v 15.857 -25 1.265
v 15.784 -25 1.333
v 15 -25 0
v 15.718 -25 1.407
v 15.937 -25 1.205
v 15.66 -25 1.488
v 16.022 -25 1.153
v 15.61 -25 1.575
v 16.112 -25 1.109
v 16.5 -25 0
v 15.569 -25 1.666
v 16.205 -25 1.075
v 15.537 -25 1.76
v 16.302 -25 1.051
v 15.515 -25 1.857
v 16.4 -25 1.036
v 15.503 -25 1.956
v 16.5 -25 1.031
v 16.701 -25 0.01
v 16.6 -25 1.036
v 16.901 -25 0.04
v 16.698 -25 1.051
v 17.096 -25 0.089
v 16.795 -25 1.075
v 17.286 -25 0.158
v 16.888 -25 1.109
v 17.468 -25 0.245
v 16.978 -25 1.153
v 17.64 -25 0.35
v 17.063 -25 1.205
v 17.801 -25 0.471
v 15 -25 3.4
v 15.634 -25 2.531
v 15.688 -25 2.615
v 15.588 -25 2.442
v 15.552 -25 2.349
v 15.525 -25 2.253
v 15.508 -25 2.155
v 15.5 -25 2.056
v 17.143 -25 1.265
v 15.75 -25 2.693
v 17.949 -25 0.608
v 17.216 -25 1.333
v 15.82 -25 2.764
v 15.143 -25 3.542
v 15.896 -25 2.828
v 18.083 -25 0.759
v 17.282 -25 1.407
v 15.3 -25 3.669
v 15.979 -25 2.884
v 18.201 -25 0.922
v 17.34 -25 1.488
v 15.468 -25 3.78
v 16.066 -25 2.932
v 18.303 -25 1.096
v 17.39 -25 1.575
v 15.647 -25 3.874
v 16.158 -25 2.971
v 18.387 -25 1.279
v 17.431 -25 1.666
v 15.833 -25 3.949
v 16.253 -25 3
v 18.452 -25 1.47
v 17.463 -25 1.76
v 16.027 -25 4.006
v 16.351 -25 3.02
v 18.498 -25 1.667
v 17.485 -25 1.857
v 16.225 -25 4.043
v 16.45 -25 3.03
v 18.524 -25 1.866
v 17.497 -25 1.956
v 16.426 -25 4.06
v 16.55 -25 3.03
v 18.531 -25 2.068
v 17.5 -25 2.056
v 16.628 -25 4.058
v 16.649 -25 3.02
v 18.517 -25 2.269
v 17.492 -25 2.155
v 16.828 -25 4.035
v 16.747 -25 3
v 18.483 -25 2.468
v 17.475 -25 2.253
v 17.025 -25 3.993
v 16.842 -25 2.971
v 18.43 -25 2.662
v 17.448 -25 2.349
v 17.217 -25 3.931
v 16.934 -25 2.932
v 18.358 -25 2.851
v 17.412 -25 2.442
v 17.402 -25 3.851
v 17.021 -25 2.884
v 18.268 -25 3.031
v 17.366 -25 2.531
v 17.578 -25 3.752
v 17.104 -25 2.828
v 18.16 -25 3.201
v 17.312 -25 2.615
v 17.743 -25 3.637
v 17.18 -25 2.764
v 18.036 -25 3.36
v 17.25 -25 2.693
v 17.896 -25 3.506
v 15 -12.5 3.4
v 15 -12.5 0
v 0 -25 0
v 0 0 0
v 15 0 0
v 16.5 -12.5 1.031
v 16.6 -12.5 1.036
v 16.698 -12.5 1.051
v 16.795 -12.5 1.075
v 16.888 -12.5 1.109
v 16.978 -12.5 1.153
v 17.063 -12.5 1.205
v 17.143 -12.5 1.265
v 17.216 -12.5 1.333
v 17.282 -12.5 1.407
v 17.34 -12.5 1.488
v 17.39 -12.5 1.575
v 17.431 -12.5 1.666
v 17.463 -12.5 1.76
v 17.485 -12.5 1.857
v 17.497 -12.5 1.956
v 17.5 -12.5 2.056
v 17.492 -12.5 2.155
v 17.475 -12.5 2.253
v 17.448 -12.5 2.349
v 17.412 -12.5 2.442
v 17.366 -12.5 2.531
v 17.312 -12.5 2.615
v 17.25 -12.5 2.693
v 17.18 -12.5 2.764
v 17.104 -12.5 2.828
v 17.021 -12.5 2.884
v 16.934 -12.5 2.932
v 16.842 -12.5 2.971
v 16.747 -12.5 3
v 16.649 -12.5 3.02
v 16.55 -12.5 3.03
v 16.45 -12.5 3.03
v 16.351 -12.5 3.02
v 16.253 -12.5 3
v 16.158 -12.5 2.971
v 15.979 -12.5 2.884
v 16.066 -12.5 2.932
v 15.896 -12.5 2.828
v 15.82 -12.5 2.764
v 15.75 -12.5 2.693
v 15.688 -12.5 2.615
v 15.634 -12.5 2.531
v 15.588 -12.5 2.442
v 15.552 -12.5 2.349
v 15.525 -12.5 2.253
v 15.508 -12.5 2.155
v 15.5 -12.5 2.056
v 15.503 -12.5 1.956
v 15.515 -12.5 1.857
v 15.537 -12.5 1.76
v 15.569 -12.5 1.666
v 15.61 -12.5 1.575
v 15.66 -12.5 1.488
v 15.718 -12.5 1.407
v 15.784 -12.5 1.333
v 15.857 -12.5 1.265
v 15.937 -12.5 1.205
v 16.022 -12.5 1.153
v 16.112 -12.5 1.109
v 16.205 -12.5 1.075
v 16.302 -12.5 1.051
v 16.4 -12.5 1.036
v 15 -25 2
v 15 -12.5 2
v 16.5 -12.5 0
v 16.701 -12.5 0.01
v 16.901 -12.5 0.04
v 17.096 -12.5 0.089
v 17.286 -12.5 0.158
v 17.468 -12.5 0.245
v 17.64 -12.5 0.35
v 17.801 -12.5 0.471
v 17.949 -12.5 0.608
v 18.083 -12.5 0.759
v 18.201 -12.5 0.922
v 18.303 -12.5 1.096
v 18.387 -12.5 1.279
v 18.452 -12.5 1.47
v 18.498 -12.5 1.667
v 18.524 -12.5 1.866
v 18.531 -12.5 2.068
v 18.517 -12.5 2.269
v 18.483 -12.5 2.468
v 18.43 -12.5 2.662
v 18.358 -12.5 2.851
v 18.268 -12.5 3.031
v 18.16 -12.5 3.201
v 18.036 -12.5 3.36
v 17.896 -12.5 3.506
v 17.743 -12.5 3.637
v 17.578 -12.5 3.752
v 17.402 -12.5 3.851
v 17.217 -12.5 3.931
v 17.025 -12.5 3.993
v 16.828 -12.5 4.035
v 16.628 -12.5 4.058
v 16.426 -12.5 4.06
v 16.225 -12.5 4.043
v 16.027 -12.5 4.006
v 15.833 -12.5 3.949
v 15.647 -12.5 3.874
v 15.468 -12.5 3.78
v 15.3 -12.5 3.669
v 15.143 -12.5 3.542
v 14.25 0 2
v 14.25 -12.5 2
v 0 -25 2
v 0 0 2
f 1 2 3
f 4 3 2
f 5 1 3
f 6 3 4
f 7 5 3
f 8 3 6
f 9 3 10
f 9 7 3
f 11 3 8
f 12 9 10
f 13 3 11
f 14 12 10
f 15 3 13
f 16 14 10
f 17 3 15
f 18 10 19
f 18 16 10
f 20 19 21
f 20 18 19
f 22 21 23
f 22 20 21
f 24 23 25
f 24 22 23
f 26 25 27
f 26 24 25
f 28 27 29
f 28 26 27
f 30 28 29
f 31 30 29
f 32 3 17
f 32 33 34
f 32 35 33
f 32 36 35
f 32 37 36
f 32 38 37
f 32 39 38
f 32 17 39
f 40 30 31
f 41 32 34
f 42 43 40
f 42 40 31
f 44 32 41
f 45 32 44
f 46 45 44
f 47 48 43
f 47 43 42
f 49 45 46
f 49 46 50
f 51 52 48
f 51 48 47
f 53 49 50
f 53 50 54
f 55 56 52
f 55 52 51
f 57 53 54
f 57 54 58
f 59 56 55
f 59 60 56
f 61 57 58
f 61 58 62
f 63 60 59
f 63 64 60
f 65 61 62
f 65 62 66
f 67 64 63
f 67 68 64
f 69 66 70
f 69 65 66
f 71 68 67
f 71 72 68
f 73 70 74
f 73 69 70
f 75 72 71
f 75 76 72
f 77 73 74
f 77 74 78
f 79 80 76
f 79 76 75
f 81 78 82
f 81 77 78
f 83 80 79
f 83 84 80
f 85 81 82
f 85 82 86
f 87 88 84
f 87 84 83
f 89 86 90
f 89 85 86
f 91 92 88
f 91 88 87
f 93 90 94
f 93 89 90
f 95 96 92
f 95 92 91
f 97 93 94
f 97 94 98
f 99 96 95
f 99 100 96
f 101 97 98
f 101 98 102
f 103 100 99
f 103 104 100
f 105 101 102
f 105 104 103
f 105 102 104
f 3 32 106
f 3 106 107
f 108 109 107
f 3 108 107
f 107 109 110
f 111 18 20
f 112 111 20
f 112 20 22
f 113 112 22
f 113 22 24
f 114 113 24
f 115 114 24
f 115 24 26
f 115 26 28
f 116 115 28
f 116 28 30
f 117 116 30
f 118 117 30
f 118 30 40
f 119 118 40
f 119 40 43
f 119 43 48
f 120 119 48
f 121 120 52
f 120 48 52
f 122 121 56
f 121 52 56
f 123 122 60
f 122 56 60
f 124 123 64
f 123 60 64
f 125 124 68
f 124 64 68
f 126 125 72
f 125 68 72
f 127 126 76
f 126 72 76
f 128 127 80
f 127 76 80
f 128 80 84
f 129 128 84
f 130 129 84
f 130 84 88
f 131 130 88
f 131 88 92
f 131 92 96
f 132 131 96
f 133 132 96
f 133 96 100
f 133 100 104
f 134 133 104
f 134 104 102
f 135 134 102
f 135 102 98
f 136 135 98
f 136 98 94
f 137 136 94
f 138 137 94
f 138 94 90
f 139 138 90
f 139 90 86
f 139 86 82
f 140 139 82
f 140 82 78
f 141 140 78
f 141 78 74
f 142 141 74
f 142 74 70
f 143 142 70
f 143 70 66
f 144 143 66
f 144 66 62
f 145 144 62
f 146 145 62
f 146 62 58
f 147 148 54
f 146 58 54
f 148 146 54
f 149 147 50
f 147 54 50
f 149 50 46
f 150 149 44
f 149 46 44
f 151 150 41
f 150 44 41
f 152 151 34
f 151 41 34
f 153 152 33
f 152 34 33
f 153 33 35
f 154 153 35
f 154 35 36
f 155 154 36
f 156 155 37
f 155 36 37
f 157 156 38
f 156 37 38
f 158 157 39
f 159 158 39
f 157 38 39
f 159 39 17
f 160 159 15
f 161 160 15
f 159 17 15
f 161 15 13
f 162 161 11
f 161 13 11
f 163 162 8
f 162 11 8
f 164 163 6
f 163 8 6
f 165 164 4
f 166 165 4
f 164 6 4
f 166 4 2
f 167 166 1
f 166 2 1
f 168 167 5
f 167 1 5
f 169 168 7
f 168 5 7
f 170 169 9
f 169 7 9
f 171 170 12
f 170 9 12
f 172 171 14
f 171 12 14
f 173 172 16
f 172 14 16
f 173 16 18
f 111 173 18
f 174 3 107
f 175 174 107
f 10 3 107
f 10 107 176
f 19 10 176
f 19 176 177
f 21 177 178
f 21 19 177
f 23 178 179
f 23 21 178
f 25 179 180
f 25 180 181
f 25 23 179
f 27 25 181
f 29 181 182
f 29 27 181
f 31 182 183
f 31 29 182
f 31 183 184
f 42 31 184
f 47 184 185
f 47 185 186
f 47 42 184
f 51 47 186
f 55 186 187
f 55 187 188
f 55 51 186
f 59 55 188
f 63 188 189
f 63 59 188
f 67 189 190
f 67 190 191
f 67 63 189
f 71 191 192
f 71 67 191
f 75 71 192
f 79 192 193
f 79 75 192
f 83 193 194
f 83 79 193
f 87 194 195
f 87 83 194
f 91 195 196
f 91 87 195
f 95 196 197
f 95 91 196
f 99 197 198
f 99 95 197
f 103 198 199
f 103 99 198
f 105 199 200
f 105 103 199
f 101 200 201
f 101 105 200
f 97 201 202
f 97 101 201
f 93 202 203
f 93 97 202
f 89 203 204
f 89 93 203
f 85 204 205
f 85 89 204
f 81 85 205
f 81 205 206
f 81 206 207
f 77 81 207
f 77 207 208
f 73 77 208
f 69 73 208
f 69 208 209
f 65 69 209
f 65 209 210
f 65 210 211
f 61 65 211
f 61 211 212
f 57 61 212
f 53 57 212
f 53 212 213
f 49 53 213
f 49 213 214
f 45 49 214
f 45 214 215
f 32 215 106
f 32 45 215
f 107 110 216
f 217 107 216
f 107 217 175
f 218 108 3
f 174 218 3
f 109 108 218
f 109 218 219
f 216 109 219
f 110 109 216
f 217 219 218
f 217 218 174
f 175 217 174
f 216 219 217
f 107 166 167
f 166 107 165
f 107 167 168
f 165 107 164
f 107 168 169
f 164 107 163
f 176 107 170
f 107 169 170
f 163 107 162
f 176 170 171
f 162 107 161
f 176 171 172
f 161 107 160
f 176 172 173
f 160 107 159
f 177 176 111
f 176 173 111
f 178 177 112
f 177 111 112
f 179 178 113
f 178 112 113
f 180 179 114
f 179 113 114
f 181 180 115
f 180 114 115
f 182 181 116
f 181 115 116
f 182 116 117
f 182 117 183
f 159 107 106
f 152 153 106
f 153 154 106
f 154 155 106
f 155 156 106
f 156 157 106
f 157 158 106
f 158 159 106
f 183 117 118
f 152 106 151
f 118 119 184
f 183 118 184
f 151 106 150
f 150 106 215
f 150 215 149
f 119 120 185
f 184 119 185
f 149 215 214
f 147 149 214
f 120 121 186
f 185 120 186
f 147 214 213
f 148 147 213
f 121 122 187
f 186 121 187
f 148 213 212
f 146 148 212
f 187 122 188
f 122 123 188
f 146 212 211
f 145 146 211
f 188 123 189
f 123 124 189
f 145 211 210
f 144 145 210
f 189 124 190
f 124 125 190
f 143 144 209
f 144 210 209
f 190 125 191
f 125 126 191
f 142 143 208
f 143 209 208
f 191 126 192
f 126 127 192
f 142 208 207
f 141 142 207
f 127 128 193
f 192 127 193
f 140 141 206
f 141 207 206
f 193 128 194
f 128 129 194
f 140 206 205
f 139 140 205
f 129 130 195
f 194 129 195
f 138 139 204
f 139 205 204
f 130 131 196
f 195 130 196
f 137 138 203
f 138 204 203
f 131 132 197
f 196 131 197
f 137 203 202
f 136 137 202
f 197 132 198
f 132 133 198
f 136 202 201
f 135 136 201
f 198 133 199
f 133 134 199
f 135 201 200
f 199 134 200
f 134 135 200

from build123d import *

# Parameters (mm, degrees)
SKETCH1_W           = 15
SKETCH1_H           = 25
BOSS_EXTRUDE1_DEPTH = 2
BOSS_EXTRUDE3_DEPTH = 12.5
SKETCH5_R           = 1
CUT_EXTRUDE2_DEPTH  = 32.382981587
CUT_EXTRUDE4_DEPTH  = 12.5


with BuildPart() as part:
    # Sketch1 → Boss-Extrude1 (new body)
    with BuildSketch(Plane.XY):
        with Locations((7.5, -12.5)):
            Rectangle(SKETCH1_W, SKETCH1_H)
    extrude(amount=BOSS_EXTRUDE1_DEPTH)

    # Sketch7 → Cut-Extrude4 (cut)
    with BuildSketch(Plane(origin=(0, 0, 0), x_dir=(1, 0, 0), z_dir=(0, 1, 0))):
        Polygon((15, 0), (14.25, -2), (15, -2), align=None)
    extrude(amount=-CUT_EXTRUDE4_DEPTH, mode=Mode.SUBTRACT)


with BuildPart() as body_2:
    # Sketch4 → Boss-Extrude3 (new body)
    with BuildSketch(Plane.XZ.offset(25)):
        with BuildLine():
            Line((15, 0), (16.5, 0))
            ThreePointArc((16.5, 0), (18.358090418, 2.850628125), (15, 3.4))
            Line((15, 3.4), (15, 0))
        make_face()
    extrude(amount=-BOSS_EXTRUDE3_DEPTH)

    # Sketch5 → Cut-Extrude2 (cut, through all)
    with BuildSketch(Plane.XZ.offset(25)):
        with Locations(Location((16.5, 2.030882353, 0), (0, 0, 270))):
            Circle(SKETCH5_R)
    extrude(amount=-CUT_EXTRUDE2_DEPTH, mode=Mode.SUBTRACT)


solid = Compound([part.part, body_2.part])
